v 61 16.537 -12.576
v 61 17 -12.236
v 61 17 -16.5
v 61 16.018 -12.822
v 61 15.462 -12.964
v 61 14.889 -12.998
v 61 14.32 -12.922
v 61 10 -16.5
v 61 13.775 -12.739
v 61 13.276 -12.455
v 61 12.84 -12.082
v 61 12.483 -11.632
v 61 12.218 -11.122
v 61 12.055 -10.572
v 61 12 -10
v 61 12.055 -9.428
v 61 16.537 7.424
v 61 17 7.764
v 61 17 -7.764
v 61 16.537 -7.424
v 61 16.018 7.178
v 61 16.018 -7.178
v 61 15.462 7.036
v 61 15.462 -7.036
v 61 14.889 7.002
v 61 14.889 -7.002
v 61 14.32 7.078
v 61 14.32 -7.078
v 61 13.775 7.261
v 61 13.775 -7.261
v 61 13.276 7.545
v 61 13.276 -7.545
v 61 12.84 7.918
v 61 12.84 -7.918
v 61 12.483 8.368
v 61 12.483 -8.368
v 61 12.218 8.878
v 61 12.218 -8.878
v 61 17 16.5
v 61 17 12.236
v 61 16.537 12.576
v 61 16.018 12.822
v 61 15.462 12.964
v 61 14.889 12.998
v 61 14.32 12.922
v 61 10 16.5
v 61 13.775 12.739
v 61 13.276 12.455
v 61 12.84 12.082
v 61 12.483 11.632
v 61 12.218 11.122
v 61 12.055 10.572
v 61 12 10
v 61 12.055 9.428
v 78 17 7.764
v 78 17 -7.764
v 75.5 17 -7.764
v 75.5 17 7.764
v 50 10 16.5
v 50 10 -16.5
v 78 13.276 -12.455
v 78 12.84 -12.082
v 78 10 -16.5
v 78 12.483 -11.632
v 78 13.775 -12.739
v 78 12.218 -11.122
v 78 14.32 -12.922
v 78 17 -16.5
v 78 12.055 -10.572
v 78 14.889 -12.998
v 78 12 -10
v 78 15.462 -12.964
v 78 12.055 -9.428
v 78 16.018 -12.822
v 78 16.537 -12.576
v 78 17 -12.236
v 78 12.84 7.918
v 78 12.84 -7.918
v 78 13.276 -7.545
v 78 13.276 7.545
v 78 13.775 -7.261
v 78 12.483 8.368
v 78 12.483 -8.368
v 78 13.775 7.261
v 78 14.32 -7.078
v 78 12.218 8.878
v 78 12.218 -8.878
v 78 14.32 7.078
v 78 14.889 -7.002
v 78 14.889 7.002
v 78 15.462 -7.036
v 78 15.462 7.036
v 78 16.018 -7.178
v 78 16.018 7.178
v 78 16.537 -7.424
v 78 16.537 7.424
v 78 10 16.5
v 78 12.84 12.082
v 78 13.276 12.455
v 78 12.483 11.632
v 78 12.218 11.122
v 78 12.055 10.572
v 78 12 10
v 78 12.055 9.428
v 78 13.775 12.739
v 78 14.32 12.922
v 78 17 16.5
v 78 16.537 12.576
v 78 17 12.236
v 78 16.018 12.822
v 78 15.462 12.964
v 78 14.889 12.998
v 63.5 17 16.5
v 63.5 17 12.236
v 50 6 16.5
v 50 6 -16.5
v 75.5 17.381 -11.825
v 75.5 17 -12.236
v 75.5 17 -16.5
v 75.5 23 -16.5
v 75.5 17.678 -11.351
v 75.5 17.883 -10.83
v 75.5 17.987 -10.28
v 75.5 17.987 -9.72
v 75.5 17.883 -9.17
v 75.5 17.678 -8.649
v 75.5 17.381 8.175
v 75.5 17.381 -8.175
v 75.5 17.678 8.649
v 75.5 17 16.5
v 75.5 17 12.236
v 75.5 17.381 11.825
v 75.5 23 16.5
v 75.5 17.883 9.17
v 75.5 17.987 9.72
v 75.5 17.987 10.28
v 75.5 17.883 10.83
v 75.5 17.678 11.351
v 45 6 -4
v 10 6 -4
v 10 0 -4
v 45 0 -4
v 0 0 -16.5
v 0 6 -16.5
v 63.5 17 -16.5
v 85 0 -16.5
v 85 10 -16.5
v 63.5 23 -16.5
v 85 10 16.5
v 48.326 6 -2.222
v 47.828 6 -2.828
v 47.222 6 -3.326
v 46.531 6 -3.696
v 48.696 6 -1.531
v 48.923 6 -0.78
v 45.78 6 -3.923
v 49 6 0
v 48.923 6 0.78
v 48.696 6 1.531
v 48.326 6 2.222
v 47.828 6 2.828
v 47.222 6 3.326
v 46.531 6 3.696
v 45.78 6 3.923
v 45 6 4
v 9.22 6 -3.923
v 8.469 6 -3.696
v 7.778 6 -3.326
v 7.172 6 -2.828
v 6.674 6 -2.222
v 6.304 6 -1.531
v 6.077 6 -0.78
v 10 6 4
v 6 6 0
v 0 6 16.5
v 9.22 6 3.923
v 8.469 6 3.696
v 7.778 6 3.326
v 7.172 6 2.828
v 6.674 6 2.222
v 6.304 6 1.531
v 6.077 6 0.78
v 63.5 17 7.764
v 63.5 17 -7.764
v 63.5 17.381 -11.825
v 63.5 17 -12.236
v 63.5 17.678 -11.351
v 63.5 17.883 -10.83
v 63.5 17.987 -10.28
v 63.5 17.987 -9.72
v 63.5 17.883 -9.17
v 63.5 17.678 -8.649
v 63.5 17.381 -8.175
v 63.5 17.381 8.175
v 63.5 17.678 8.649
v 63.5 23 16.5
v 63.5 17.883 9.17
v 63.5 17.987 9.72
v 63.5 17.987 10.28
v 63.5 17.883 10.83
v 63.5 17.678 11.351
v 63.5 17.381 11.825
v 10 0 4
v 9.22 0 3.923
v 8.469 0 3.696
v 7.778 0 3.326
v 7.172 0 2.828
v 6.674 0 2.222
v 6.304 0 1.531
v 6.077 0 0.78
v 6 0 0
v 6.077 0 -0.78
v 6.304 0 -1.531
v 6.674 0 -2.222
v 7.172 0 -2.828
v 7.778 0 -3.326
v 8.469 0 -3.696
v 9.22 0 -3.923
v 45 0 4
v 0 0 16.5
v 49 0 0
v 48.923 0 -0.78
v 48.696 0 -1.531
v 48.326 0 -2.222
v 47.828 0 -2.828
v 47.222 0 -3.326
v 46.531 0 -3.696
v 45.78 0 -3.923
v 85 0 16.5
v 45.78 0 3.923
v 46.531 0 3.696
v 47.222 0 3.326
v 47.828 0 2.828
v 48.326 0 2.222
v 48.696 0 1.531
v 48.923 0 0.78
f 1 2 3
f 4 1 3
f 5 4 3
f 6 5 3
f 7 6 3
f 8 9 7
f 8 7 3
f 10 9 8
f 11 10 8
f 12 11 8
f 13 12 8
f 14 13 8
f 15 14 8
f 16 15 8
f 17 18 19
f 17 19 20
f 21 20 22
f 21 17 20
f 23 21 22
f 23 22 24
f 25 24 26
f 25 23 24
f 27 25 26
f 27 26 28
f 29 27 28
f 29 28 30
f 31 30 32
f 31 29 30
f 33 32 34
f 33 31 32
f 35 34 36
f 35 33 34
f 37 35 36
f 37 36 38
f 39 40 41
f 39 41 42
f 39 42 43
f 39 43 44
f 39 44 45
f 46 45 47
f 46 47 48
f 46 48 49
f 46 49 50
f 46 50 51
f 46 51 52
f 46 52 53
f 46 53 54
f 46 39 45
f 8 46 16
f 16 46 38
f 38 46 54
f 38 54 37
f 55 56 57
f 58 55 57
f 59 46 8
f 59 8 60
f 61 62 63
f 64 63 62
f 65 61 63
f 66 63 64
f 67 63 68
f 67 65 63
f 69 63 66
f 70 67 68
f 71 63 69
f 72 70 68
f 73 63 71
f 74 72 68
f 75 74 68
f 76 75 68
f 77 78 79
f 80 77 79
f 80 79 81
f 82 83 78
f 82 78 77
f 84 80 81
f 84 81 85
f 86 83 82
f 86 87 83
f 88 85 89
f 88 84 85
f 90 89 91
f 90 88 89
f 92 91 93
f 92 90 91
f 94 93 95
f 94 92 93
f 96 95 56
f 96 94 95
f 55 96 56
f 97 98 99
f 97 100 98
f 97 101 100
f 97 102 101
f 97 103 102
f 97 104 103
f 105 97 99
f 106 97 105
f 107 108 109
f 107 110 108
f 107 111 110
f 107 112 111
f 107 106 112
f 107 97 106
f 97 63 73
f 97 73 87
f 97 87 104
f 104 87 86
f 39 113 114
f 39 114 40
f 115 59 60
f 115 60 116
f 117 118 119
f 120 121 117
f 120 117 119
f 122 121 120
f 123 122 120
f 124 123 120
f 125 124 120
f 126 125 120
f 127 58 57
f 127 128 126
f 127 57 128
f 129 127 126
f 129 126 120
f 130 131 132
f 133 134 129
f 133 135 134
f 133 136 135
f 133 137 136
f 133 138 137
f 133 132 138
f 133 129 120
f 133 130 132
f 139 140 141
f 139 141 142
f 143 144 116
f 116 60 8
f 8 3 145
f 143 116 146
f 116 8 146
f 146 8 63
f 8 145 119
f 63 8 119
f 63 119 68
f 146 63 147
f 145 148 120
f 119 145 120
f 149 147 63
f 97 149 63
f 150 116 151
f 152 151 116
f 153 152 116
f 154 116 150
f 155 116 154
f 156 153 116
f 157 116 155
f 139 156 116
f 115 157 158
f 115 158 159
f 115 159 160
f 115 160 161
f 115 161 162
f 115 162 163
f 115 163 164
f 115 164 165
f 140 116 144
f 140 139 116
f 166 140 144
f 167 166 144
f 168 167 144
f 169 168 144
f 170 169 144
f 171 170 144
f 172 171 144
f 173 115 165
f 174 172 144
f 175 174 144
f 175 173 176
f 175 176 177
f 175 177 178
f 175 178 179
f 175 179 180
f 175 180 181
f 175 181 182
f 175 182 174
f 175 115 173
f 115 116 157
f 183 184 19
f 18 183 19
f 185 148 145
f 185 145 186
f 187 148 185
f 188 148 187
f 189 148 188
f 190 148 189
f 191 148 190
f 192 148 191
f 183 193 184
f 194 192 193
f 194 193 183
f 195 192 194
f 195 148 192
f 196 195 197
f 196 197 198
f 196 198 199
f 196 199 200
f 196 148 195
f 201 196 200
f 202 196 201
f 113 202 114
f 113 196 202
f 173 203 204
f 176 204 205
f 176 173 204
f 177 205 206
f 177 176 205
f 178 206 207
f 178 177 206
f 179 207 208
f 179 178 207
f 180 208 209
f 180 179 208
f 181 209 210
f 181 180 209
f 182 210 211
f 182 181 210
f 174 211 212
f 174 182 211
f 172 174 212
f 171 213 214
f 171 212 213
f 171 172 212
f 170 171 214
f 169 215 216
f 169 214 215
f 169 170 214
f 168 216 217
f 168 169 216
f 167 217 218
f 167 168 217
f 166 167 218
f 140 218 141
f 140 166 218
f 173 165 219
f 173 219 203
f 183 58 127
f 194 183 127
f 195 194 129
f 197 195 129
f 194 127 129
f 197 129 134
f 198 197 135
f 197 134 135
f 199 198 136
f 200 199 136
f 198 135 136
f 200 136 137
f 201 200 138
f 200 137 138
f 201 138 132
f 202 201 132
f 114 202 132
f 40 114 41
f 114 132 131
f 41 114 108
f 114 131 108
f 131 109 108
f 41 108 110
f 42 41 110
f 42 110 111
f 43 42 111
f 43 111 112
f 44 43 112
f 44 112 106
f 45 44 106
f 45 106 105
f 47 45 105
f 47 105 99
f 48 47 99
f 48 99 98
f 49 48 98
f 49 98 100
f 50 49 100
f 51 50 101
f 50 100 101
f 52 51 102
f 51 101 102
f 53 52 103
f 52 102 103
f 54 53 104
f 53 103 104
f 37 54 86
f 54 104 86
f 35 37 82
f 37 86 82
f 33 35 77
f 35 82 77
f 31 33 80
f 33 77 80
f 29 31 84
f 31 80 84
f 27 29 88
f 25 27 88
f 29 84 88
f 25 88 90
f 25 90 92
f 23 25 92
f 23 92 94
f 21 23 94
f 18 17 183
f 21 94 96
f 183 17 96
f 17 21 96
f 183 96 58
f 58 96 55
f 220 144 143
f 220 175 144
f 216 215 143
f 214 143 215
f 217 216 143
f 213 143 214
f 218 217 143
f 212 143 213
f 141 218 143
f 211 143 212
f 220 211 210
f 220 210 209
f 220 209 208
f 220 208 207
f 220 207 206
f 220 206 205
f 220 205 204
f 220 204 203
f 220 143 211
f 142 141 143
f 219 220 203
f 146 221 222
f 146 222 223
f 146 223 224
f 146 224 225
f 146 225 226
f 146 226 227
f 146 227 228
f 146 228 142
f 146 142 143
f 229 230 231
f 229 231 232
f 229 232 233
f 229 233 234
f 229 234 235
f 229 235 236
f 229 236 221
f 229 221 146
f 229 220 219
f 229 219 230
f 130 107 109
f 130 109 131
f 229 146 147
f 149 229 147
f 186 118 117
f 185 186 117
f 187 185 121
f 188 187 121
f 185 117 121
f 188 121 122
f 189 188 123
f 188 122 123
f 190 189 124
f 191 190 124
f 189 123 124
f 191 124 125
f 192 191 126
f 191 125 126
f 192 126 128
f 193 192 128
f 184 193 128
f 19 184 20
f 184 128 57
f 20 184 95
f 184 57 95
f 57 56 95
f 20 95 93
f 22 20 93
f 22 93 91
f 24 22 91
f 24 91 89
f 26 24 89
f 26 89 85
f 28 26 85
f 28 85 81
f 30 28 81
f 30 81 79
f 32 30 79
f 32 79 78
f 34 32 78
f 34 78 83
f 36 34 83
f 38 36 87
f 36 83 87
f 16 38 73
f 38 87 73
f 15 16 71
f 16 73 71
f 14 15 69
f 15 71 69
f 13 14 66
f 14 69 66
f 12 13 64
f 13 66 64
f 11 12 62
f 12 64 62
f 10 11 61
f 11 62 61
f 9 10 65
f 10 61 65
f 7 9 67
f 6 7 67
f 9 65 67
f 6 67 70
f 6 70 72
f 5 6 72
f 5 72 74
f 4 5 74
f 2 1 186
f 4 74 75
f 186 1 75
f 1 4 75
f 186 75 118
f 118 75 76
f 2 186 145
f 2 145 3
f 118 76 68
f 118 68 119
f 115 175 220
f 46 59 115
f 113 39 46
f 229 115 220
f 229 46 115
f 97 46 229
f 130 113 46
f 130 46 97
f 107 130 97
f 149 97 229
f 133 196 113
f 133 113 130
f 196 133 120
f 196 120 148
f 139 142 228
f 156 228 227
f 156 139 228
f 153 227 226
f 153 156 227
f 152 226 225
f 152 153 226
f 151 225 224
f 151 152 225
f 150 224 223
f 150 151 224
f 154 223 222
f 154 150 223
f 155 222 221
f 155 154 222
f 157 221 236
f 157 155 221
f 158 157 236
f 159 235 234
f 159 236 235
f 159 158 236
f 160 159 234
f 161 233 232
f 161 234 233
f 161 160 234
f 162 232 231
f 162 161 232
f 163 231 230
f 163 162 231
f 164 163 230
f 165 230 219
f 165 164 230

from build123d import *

# Parameters (mm, degrees)
EXTRUDE_1_DEPTH     = 16.5
CUT_EXTRUDE_1_DEPTH = 89.239730281
SKETCH_3_R          = 3
CUT_EXTRUDE_2_DEPTH = 33


with BuildPart() as part:
    # 草圖1 → 填料-伸長1 (new, symmetric)
    with BuildSketch(Plane.XY):
        Polygon((0, 0), (85, 0), (85, 10), (78, 10), (78, 17), (75.5, 17), (75.5, 23), (63.5, 23), (63.5, 17), (61, 17), (61, 10), (50, 10), (50, 6), (0, 6), align=None)
    extrude(amount=EXTRUDE_1_DEPTH, both=True)

    # 草圖2 → 除料-伸長1 (cut, through all)
    with BuildSketch(Plane(origin=(0, 6, 0), x_dir=(1, 0, 0), z_dir=(0, 1, 0))):
        with BuildLine():
            Line((10, 4), (45, 4))
            ThreePointArc((45, 4), (49, 0), (45, -4))
            Line((45, -4), (10, -4))
            ThreePointArc((10, -4), (6, 0), (10, 4))
        make_face()
    extrude(amount=-CUT_EXTRUDE_1_DEPTH, mode=Mode.SUBTRACT)

    # 草圖3 → 除料-伸長2 (cut)
    with BuildSketch(Plane(origin=(78, 0, 0), x_dir=(0, 0, -1), z_dir=(1, 0, 0))):
        with Locations(Location((-10, 15, 0), (0, 0, 41.810314896))):
            Circle(SKETCH_3_R)
        with Locations(Location((10, 15, 0), (0, 0, 41.810314896))):
            Circle(SKETCH_3_R)
    extrude(amount=-CUT_EXTRUDE_2_DEPTH, mode=Mode.SUBTRACT)


solid = part.part
